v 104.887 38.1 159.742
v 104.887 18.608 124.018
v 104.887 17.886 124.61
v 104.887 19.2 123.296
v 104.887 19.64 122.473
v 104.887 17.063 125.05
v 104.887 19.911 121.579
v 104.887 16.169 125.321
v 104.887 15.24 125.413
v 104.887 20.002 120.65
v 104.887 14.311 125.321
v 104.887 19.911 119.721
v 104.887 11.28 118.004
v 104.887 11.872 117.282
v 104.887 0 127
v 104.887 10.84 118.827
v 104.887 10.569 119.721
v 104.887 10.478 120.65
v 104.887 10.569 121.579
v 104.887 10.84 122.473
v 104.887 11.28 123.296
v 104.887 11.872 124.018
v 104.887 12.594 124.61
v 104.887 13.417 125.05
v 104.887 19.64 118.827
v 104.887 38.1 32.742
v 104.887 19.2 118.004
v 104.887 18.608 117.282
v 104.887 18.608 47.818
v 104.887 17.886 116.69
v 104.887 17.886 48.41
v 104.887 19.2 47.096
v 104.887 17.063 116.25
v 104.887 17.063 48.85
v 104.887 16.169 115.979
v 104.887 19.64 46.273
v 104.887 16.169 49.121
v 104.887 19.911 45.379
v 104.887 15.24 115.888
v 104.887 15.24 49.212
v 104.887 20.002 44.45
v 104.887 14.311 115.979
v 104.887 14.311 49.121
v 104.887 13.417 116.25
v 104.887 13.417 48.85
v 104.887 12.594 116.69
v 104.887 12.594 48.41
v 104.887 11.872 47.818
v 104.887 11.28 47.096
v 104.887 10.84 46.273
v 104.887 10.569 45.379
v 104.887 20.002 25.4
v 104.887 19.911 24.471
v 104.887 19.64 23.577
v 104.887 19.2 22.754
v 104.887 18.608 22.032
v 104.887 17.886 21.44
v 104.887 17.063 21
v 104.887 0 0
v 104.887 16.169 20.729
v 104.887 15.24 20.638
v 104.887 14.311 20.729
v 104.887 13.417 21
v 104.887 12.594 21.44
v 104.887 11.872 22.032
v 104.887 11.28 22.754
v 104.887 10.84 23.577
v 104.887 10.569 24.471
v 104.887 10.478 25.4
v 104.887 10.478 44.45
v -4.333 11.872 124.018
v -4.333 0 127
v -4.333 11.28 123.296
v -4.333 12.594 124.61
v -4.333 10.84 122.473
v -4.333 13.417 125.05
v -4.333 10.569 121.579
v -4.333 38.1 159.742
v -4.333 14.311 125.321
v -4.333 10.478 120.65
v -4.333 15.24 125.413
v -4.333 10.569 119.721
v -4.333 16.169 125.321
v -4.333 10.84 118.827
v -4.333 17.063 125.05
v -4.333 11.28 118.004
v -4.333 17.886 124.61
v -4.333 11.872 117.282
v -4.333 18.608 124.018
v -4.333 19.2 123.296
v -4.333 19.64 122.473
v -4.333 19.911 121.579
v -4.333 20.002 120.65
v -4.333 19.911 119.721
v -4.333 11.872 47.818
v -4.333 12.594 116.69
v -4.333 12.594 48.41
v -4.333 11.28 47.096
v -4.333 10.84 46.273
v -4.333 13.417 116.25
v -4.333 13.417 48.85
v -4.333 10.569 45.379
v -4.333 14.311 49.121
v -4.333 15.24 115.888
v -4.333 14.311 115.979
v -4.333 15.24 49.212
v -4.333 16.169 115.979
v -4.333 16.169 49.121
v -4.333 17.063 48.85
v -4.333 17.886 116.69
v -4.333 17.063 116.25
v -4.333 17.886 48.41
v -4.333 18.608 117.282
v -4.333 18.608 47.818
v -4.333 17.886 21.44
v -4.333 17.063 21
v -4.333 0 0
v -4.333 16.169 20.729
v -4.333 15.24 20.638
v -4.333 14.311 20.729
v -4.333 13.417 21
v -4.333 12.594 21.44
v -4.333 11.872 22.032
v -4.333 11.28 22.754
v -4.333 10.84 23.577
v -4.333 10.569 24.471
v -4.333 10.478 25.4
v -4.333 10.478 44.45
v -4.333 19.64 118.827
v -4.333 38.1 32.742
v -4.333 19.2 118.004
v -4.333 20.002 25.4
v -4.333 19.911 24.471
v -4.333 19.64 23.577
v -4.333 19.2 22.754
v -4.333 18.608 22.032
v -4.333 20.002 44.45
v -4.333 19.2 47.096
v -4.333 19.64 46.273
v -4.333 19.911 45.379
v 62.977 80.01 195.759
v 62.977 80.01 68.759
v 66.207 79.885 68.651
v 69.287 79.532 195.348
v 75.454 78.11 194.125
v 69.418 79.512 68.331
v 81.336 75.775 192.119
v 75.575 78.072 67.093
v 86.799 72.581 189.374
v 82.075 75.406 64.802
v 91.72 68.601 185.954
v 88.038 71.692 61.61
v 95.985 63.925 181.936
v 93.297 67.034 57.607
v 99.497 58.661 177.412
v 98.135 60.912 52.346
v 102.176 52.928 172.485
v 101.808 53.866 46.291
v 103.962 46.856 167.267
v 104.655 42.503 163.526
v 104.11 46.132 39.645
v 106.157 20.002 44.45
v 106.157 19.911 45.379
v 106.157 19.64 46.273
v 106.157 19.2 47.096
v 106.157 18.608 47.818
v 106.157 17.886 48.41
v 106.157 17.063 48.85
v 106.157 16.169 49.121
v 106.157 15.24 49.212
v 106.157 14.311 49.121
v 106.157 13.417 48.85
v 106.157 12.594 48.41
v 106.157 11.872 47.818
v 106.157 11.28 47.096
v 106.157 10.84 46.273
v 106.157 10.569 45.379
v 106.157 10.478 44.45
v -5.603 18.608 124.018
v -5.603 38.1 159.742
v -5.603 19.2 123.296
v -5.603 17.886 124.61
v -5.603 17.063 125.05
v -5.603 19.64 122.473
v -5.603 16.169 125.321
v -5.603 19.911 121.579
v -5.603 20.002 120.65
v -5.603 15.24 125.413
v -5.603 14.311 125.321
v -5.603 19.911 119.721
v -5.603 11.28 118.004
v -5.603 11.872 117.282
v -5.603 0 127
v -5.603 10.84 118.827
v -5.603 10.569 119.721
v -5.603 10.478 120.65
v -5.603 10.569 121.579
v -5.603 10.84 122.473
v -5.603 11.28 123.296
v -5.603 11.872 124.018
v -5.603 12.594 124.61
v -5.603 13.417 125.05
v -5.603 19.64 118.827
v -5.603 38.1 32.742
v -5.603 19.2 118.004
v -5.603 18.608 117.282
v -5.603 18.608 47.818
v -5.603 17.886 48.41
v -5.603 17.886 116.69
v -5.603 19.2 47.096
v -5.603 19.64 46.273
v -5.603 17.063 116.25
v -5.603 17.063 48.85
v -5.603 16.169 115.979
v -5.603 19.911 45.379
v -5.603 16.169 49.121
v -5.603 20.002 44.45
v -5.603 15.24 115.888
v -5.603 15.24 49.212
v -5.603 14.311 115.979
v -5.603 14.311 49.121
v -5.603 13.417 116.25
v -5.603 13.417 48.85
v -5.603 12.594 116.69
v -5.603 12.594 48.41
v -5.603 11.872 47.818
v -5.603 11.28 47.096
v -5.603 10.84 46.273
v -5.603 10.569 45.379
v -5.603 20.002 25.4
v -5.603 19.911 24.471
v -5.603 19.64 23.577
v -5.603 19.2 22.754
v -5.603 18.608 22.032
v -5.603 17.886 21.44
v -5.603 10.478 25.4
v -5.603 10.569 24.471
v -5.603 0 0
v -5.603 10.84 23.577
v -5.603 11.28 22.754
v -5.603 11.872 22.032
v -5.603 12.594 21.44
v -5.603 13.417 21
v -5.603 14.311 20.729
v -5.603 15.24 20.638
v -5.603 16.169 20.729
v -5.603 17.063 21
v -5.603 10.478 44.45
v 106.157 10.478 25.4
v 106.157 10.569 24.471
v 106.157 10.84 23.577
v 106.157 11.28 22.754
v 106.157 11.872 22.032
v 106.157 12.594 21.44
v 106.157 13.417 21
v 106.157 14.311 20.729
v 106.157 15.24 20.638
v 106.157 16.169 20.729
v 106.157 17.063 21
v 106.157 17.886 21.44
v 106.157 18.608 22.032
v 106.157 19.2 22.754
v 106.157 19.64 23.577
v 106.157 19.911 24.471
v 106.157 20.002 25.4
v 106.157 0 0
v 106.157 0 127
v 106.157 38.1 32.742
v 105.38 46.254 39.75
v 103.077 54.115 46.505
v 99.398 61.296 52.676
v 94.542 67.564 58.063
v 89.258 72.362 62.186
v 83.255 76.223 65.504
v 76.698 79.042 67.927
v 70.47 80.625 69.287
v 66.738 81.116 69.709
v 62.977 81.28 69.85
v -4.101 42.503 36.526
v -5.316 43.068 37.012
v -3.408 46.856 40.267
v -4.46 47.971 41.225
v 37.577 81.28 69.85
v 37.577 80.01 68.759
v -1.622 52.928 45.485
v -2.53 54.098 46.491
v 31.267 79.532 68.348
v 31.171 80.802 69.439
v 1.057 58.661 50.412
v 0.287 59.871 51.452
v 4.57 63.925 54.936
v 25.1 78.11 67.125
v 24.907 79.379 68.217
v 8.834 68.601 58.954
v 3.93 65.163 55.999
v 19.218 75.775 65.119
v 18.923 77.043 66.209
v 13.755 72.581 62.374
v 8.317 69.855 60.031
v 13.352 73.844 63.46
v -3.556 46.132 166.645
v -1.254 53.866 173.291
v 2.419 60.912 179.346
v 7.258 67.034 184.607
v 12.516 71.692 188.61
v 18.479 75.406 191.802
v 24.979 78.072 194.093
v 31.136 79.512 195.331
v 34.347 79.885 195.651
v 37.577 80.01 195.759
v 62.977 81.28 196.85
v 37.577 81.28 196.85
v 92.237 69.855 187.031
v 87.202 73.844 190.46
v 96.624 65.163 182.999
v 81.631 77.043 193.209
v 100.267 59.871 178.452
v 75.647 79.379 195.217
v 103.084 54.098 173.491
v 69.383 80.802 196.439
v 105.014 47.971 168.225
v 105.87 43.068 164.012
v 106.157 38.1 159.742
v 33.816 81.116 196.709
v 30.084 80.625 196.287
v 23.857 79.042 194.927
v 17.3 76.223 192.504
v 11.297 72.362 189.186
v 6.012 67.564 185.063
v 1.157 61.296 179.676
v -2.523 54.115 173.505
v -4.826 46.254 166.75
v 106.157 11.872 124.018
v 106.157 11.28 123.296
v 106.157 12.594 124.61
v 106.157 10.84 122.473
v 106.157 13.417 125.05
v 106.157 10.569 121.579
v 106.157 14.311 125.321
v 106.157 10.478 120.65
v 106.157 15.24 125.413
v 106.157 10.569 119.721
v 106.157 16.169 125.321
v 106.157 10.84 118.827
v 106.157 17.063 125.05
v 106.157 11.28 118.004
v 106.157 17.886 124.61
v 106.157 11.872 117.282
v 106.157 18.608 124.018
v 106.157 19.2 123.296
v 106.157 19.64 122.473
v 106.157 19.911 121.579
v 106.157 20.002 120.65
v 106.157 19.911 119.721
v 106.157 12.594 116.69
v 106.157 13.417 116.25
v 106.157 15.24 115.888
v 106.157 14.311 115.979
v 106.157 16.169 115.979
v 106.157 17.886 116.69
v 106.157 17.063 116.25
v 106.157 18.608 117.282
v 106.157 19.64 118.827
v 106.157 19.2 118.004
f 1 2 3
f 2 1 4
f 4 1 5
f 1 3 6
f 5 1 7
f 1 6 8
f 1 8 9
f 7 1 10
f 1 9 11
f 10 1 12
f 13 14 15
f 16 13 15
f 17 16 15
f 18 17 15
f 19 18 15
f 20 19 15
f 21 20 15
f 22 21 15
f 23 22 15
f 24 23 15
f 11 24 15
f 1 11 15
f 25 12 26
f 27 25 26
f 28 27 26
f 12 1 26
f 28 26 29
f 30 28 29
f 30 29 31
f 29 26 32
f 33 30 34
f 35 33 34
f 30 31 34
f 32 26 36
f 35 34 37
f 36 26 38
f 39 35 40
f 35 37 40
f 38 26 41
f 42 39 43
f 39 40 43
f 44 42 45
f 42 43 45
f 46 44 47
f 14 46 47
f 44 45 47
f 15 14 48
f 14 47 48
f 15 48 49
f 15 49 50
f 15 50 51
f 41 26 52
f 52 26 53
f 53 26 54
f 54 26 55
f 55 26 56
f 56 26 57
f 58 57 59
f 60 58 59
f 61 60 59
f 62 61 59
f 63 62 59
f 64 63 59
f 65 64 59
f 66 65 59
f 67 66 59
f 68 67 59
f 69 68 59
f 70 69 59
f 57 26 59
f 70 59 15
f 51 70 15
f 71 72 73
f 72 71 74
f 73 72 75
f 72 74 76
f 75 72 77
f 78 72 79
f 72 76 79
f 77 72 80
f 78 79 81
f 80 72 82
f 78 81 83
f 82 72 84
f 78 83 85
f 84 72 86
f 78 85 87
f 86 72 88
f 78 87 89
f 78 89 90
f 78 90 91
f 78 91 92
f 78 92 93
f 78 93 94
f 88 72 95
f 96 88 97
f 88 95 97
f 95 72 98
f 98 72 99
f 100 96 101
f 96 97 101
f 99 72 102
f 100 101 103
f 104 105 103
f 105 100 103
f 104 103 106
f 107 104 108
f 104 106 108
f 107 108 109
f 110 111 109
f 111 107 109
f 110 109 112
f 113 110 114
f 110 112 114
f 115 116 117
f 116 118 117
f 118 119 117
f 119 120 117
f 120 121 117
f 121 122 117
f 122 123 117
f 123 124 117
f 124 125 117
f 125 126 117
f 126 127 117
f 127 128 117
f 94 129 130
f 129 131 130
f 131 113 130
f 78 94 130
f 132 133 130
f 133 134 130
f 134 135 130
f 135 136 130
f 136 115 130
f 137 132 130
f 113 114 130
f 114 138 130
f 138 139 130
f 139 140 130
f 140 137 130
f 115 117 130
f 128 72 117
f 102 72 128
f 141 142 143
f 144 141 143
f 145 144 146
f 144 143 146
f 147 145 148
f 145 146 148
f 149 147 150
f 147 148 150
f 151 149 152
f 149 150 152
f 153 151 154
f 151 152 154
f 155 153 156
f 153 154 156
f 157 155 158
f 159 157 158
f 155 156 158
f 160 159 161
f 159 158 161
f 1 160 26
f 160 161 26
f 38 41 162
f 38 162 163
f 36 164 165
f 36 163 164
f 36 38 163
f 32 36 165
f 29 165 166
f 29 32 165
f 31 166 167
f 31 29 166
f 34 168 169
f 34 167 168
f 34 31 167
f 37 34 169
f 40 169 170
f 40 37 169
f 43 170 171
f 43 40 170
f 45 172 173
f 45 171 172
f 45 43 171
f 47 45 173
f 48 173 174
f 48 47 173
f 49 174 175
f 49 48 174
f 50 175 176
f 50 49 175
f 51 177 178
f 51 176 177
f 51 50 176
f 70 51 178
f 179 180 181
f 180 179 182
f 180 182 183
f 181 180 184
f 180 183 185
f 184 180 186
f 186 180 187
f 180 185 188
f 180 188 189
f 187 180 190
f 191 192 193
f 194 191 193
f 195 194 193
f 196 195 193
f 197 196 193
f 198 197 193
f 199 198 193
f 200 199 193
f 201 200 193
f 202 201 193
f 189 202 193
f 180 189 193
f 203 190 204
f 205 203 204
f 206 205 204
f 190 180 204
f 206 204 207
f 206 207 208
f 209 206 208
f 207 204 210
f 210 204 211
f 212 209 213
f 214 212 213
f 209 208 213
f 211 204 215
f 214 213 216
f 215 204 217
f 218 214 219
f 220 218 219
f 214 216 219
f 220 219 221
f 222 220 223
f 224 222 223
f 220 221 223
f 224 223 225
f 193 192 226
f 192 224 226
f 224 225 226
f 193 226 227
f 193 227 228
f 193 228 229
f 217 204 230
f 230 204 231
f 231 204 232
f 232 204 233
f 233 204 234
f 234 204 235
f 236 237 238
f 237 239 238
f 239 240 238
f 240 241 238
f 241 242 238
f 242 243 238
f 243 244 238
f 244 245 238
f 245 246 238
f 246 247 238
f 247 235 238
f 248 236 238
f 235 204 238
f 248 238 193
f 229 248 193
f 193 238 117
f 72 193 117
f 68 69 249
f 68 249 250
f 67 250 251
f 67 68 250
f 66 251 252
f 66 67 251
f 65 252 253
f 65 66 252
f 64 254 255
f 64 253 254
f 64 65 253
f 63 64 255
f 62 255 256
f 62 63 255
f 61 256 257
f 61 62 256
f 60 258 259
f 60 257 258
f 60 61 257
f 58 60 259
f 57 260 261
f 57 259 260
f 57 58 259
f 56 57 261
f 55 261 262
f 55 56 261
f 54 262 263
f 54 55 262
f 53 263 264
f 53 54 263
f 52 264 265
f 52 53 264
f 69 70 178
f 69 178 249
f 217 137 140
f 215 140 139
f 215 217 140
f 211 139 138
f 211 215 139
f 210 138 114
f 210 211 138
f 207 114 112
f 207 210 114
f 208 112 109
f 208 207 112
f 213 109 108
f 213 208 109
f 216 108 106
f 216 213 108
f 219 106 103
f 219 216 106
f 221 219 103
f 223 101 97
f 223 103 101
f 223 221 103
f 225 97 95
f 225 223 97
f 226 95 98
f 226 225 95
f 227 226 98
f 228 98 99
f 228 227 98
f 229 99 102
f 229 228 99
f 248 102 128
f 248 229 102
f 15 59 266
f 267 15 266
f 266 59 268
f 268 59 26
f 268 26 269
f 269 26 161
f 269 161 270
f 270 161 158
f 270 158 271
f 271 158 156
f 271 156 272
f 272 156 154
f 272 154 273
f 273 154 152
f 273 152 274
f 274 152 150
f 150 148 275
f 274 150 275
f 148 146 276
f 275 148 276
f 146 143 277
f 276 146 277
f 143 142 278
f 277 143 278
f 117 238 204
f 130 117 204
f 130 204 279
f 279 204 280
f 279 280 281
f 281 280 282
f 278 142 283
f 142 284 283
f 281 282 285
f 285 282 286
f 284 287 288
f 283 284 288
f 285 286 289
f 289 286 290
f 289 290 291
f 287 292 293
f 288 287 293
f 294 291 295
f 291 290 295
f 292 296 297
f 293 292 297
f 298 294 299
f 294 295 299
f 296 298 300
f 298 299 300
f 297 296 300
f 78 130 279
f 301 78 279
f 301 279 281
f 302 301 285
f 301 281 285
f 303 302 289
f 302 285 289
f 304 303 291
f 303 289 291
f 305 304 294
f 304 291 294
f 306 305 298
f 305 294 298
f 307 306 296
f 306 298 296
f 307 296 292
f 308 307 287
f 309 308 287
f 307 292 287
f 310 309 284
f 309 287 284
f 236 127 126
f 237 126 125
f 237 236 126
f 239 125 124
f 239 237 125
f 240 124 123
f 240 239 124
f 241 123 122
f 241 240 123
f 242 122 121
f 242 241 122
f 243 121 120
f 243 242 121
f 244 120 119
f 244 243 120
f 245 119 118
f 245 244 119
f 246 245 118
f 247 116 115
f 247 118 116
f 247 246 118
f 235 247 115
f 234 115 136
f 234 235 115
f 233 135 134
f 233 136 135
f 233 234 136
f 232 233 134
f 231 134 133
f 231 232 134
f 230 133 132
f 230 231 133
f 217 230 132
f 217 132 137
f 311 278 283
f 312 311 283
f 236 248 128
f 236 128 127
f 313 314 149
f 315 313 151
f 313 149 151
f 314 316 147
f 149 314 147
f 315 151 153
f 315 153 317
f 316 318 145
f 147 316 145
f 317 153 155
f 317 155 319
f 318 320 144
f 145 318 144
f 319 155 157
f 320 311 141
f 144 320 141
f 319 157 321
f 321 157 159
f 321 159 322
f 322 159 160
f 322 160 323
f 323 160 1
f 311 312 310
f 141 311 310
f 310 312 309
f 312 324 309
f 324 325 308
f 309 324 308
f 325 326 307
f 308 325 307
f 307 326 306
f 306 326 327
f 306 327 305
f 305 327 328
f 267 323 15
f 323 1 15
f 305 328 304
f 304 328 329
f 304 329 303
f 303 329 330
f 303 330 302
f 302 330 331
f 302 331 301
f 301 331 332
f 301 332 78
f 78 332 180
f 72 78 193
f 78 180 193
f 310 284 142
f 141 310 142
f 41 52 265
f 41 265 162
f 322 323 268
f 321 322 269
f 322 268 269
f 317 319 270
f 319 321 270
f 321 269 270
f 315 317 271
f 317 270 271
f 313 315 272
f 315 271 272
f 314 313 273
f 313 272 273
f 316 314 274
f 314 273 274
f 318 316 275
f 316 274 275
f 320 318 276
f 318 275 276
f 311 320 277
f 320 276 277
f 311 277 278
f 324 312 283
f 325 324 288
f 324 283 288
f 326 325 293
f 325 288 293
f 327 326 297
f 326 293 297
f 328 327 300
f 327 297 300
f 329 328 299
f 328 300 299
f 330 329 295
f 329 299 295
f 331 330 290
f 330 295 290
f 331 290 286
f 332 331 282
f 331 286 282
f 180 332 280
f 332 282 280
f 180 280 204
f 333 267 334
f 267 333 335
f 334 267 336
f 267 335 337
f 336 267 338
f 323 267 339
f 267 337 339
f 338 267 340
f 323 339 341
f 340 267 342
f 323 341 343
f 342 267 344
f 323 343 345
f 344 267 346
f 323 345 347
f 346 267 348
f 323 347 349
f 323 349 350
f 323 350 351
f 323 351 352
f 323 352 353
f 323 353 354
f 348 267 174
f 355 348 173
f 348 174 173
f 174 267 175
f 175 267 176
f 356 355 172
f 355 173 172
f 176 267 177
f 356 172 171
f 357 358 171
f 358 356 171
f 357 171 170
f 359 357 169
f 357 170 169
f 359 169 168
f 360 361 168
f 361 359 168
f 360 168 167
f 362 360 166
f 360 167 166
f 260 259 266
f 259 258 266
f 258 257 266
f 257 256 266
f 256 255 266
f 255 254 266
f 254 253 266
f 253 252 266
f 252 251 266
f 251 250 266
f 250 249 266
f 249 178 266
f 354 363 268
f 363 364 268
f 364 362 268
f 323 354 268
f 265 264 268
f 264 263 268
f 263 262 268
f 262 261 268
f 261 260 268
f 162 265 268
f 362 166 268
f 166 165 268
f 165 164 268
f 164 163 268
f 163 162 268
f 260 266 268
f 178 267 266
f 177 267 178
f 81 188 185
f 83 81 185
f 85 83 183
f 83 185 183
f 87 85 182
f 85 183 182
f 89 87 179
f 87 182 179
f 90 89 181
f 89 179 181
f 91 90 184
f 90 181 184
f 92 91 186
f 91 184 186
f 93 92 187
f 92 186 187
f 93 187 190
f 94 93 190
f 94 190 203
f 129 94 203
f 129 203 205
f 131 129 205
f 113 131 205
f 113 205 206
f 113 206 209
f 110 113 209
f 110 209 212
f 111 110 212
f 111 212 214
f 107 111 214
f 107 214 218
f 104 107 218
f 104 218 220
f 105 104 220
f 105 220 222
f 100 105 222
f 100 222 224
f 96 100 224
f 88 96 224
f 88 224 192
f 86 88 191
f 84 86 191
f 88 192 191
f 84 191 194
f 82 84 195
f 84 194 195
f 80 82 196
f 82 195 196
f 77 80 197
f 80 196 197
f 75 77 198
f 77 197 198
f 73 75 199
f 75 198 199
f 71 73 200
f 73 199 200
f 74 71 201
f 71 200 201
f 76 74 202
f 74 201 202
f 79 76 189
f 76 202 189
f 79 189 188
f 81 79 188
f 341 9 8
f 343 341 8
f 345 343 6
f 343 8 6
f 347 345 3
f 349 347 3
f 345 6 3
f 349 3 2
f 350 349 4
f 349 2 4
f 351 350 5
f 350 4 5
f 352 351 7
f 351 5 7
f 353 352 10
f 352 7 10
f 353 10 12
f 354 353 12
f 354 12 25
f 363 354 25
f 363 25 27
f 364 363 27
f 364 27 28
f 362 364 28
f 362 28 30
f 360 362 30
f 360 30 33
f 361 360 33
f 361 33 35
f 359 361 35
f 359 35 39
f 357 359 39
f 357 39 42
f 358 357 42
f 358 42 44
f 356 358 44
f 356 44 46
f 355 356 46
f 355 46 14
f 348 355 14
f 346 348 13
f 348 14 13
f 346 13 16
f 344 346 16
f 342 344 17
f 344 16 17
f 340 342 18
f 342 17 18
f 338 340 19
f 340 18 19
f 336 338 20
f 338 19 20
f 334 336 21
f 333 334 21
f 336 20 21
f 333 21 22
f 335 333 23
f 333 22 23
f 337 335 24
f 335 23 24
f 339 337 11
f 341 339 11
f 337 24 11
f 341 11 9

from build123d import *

# Parameters (mm, degrees)
BOSS_EXTRUDE1_DEPTH = 196.85
CUT_EXTRUDE1_DEPTH  = 152.4
SKETCH3_R           = 4.7625
CUT_EXTRUDE2_DEPTH  = 152.4


with BuildPart() as part:
    # Sketch1 → Boss-Extrude1 (new body)
    with BuildSketch(Plane.XY):
        with BuildLine():
            Line((-5.602925898, 0), (-4.332925898, 0))
            Line((-4.332925898, 0), (-4.332925898, 38.1))
            ThreePointArc((-4.332925898, 38.1), (7.942228903, 67.7348452), (37.577074102, 80.01))
            Line((37.577074102, 80.01), (62.977074102, 80.01))
            ThreePointArc((62.977074102, 80.01), (92.611919302, 67.7348452), (104.887074102, 38.1))
            Line((104.887074102, 38.1), (104.887074102, 0))
            Line((104.887074102, 0), (106.157074102, 0))
            Line((106.157074102, 0), (106.157074102, 38.1))
            ThreePointArc((106.157074102, 38.1), (93.509944914, 68.632870812), (62.977074102, 81.28))
            Line((62.977074102, 81.28), (37.577074102, 81.28))
            ThreePointArc((37.577074102, 81.28), (7.04420329, 68.632870812), (-5.602925898, 38.1))
            Line((-5.602925898, 38.1), (-5.602925898, 0))
        make_face()
    extrude(amount=BOSS_EXTRUDE1_DEPTH)

    # Sketch2 → Cut-Extrude1 (cut)
    with BuildSketch(Plane.ZY.offset(5.602925898)):
        Polygon((0, 0), (69.85, 81.28), (0, 81.28), align=None)
        Polygon((196.85, 81.28), (127, 0), (196.85, 0), align=None)
    extrude(amount=-CUT_EXTRUDE1_DEPTH, mode=Mode.SUBTRACT)

    # Sketch3 → Cut-Extrude2 (cut)
    with BuildSketch(Plane.ZY.offset(5.602925898)):
        with Locations((120.65, 15.24)):
            Circle(SKETCH3_R)
        with BuildLine():
            Line((25.4, 20.0025), (44.45, 20.0025))
            ThreePointArc((44.45, 20.0025), (49.2125, 15.24), (44.45, 10.4775))
            Line((44.45, 10.4775), (25.4, 10.4775))
            ThreePointArc((25.4, 10.4775), (20.6375, 15.24), (25.4, 20.0025))
        make_face()
    extrude(amount=-CUT_EXTRUDE2_DEPTH, mode=Mode.SUBTRACT)


solid = part.part
